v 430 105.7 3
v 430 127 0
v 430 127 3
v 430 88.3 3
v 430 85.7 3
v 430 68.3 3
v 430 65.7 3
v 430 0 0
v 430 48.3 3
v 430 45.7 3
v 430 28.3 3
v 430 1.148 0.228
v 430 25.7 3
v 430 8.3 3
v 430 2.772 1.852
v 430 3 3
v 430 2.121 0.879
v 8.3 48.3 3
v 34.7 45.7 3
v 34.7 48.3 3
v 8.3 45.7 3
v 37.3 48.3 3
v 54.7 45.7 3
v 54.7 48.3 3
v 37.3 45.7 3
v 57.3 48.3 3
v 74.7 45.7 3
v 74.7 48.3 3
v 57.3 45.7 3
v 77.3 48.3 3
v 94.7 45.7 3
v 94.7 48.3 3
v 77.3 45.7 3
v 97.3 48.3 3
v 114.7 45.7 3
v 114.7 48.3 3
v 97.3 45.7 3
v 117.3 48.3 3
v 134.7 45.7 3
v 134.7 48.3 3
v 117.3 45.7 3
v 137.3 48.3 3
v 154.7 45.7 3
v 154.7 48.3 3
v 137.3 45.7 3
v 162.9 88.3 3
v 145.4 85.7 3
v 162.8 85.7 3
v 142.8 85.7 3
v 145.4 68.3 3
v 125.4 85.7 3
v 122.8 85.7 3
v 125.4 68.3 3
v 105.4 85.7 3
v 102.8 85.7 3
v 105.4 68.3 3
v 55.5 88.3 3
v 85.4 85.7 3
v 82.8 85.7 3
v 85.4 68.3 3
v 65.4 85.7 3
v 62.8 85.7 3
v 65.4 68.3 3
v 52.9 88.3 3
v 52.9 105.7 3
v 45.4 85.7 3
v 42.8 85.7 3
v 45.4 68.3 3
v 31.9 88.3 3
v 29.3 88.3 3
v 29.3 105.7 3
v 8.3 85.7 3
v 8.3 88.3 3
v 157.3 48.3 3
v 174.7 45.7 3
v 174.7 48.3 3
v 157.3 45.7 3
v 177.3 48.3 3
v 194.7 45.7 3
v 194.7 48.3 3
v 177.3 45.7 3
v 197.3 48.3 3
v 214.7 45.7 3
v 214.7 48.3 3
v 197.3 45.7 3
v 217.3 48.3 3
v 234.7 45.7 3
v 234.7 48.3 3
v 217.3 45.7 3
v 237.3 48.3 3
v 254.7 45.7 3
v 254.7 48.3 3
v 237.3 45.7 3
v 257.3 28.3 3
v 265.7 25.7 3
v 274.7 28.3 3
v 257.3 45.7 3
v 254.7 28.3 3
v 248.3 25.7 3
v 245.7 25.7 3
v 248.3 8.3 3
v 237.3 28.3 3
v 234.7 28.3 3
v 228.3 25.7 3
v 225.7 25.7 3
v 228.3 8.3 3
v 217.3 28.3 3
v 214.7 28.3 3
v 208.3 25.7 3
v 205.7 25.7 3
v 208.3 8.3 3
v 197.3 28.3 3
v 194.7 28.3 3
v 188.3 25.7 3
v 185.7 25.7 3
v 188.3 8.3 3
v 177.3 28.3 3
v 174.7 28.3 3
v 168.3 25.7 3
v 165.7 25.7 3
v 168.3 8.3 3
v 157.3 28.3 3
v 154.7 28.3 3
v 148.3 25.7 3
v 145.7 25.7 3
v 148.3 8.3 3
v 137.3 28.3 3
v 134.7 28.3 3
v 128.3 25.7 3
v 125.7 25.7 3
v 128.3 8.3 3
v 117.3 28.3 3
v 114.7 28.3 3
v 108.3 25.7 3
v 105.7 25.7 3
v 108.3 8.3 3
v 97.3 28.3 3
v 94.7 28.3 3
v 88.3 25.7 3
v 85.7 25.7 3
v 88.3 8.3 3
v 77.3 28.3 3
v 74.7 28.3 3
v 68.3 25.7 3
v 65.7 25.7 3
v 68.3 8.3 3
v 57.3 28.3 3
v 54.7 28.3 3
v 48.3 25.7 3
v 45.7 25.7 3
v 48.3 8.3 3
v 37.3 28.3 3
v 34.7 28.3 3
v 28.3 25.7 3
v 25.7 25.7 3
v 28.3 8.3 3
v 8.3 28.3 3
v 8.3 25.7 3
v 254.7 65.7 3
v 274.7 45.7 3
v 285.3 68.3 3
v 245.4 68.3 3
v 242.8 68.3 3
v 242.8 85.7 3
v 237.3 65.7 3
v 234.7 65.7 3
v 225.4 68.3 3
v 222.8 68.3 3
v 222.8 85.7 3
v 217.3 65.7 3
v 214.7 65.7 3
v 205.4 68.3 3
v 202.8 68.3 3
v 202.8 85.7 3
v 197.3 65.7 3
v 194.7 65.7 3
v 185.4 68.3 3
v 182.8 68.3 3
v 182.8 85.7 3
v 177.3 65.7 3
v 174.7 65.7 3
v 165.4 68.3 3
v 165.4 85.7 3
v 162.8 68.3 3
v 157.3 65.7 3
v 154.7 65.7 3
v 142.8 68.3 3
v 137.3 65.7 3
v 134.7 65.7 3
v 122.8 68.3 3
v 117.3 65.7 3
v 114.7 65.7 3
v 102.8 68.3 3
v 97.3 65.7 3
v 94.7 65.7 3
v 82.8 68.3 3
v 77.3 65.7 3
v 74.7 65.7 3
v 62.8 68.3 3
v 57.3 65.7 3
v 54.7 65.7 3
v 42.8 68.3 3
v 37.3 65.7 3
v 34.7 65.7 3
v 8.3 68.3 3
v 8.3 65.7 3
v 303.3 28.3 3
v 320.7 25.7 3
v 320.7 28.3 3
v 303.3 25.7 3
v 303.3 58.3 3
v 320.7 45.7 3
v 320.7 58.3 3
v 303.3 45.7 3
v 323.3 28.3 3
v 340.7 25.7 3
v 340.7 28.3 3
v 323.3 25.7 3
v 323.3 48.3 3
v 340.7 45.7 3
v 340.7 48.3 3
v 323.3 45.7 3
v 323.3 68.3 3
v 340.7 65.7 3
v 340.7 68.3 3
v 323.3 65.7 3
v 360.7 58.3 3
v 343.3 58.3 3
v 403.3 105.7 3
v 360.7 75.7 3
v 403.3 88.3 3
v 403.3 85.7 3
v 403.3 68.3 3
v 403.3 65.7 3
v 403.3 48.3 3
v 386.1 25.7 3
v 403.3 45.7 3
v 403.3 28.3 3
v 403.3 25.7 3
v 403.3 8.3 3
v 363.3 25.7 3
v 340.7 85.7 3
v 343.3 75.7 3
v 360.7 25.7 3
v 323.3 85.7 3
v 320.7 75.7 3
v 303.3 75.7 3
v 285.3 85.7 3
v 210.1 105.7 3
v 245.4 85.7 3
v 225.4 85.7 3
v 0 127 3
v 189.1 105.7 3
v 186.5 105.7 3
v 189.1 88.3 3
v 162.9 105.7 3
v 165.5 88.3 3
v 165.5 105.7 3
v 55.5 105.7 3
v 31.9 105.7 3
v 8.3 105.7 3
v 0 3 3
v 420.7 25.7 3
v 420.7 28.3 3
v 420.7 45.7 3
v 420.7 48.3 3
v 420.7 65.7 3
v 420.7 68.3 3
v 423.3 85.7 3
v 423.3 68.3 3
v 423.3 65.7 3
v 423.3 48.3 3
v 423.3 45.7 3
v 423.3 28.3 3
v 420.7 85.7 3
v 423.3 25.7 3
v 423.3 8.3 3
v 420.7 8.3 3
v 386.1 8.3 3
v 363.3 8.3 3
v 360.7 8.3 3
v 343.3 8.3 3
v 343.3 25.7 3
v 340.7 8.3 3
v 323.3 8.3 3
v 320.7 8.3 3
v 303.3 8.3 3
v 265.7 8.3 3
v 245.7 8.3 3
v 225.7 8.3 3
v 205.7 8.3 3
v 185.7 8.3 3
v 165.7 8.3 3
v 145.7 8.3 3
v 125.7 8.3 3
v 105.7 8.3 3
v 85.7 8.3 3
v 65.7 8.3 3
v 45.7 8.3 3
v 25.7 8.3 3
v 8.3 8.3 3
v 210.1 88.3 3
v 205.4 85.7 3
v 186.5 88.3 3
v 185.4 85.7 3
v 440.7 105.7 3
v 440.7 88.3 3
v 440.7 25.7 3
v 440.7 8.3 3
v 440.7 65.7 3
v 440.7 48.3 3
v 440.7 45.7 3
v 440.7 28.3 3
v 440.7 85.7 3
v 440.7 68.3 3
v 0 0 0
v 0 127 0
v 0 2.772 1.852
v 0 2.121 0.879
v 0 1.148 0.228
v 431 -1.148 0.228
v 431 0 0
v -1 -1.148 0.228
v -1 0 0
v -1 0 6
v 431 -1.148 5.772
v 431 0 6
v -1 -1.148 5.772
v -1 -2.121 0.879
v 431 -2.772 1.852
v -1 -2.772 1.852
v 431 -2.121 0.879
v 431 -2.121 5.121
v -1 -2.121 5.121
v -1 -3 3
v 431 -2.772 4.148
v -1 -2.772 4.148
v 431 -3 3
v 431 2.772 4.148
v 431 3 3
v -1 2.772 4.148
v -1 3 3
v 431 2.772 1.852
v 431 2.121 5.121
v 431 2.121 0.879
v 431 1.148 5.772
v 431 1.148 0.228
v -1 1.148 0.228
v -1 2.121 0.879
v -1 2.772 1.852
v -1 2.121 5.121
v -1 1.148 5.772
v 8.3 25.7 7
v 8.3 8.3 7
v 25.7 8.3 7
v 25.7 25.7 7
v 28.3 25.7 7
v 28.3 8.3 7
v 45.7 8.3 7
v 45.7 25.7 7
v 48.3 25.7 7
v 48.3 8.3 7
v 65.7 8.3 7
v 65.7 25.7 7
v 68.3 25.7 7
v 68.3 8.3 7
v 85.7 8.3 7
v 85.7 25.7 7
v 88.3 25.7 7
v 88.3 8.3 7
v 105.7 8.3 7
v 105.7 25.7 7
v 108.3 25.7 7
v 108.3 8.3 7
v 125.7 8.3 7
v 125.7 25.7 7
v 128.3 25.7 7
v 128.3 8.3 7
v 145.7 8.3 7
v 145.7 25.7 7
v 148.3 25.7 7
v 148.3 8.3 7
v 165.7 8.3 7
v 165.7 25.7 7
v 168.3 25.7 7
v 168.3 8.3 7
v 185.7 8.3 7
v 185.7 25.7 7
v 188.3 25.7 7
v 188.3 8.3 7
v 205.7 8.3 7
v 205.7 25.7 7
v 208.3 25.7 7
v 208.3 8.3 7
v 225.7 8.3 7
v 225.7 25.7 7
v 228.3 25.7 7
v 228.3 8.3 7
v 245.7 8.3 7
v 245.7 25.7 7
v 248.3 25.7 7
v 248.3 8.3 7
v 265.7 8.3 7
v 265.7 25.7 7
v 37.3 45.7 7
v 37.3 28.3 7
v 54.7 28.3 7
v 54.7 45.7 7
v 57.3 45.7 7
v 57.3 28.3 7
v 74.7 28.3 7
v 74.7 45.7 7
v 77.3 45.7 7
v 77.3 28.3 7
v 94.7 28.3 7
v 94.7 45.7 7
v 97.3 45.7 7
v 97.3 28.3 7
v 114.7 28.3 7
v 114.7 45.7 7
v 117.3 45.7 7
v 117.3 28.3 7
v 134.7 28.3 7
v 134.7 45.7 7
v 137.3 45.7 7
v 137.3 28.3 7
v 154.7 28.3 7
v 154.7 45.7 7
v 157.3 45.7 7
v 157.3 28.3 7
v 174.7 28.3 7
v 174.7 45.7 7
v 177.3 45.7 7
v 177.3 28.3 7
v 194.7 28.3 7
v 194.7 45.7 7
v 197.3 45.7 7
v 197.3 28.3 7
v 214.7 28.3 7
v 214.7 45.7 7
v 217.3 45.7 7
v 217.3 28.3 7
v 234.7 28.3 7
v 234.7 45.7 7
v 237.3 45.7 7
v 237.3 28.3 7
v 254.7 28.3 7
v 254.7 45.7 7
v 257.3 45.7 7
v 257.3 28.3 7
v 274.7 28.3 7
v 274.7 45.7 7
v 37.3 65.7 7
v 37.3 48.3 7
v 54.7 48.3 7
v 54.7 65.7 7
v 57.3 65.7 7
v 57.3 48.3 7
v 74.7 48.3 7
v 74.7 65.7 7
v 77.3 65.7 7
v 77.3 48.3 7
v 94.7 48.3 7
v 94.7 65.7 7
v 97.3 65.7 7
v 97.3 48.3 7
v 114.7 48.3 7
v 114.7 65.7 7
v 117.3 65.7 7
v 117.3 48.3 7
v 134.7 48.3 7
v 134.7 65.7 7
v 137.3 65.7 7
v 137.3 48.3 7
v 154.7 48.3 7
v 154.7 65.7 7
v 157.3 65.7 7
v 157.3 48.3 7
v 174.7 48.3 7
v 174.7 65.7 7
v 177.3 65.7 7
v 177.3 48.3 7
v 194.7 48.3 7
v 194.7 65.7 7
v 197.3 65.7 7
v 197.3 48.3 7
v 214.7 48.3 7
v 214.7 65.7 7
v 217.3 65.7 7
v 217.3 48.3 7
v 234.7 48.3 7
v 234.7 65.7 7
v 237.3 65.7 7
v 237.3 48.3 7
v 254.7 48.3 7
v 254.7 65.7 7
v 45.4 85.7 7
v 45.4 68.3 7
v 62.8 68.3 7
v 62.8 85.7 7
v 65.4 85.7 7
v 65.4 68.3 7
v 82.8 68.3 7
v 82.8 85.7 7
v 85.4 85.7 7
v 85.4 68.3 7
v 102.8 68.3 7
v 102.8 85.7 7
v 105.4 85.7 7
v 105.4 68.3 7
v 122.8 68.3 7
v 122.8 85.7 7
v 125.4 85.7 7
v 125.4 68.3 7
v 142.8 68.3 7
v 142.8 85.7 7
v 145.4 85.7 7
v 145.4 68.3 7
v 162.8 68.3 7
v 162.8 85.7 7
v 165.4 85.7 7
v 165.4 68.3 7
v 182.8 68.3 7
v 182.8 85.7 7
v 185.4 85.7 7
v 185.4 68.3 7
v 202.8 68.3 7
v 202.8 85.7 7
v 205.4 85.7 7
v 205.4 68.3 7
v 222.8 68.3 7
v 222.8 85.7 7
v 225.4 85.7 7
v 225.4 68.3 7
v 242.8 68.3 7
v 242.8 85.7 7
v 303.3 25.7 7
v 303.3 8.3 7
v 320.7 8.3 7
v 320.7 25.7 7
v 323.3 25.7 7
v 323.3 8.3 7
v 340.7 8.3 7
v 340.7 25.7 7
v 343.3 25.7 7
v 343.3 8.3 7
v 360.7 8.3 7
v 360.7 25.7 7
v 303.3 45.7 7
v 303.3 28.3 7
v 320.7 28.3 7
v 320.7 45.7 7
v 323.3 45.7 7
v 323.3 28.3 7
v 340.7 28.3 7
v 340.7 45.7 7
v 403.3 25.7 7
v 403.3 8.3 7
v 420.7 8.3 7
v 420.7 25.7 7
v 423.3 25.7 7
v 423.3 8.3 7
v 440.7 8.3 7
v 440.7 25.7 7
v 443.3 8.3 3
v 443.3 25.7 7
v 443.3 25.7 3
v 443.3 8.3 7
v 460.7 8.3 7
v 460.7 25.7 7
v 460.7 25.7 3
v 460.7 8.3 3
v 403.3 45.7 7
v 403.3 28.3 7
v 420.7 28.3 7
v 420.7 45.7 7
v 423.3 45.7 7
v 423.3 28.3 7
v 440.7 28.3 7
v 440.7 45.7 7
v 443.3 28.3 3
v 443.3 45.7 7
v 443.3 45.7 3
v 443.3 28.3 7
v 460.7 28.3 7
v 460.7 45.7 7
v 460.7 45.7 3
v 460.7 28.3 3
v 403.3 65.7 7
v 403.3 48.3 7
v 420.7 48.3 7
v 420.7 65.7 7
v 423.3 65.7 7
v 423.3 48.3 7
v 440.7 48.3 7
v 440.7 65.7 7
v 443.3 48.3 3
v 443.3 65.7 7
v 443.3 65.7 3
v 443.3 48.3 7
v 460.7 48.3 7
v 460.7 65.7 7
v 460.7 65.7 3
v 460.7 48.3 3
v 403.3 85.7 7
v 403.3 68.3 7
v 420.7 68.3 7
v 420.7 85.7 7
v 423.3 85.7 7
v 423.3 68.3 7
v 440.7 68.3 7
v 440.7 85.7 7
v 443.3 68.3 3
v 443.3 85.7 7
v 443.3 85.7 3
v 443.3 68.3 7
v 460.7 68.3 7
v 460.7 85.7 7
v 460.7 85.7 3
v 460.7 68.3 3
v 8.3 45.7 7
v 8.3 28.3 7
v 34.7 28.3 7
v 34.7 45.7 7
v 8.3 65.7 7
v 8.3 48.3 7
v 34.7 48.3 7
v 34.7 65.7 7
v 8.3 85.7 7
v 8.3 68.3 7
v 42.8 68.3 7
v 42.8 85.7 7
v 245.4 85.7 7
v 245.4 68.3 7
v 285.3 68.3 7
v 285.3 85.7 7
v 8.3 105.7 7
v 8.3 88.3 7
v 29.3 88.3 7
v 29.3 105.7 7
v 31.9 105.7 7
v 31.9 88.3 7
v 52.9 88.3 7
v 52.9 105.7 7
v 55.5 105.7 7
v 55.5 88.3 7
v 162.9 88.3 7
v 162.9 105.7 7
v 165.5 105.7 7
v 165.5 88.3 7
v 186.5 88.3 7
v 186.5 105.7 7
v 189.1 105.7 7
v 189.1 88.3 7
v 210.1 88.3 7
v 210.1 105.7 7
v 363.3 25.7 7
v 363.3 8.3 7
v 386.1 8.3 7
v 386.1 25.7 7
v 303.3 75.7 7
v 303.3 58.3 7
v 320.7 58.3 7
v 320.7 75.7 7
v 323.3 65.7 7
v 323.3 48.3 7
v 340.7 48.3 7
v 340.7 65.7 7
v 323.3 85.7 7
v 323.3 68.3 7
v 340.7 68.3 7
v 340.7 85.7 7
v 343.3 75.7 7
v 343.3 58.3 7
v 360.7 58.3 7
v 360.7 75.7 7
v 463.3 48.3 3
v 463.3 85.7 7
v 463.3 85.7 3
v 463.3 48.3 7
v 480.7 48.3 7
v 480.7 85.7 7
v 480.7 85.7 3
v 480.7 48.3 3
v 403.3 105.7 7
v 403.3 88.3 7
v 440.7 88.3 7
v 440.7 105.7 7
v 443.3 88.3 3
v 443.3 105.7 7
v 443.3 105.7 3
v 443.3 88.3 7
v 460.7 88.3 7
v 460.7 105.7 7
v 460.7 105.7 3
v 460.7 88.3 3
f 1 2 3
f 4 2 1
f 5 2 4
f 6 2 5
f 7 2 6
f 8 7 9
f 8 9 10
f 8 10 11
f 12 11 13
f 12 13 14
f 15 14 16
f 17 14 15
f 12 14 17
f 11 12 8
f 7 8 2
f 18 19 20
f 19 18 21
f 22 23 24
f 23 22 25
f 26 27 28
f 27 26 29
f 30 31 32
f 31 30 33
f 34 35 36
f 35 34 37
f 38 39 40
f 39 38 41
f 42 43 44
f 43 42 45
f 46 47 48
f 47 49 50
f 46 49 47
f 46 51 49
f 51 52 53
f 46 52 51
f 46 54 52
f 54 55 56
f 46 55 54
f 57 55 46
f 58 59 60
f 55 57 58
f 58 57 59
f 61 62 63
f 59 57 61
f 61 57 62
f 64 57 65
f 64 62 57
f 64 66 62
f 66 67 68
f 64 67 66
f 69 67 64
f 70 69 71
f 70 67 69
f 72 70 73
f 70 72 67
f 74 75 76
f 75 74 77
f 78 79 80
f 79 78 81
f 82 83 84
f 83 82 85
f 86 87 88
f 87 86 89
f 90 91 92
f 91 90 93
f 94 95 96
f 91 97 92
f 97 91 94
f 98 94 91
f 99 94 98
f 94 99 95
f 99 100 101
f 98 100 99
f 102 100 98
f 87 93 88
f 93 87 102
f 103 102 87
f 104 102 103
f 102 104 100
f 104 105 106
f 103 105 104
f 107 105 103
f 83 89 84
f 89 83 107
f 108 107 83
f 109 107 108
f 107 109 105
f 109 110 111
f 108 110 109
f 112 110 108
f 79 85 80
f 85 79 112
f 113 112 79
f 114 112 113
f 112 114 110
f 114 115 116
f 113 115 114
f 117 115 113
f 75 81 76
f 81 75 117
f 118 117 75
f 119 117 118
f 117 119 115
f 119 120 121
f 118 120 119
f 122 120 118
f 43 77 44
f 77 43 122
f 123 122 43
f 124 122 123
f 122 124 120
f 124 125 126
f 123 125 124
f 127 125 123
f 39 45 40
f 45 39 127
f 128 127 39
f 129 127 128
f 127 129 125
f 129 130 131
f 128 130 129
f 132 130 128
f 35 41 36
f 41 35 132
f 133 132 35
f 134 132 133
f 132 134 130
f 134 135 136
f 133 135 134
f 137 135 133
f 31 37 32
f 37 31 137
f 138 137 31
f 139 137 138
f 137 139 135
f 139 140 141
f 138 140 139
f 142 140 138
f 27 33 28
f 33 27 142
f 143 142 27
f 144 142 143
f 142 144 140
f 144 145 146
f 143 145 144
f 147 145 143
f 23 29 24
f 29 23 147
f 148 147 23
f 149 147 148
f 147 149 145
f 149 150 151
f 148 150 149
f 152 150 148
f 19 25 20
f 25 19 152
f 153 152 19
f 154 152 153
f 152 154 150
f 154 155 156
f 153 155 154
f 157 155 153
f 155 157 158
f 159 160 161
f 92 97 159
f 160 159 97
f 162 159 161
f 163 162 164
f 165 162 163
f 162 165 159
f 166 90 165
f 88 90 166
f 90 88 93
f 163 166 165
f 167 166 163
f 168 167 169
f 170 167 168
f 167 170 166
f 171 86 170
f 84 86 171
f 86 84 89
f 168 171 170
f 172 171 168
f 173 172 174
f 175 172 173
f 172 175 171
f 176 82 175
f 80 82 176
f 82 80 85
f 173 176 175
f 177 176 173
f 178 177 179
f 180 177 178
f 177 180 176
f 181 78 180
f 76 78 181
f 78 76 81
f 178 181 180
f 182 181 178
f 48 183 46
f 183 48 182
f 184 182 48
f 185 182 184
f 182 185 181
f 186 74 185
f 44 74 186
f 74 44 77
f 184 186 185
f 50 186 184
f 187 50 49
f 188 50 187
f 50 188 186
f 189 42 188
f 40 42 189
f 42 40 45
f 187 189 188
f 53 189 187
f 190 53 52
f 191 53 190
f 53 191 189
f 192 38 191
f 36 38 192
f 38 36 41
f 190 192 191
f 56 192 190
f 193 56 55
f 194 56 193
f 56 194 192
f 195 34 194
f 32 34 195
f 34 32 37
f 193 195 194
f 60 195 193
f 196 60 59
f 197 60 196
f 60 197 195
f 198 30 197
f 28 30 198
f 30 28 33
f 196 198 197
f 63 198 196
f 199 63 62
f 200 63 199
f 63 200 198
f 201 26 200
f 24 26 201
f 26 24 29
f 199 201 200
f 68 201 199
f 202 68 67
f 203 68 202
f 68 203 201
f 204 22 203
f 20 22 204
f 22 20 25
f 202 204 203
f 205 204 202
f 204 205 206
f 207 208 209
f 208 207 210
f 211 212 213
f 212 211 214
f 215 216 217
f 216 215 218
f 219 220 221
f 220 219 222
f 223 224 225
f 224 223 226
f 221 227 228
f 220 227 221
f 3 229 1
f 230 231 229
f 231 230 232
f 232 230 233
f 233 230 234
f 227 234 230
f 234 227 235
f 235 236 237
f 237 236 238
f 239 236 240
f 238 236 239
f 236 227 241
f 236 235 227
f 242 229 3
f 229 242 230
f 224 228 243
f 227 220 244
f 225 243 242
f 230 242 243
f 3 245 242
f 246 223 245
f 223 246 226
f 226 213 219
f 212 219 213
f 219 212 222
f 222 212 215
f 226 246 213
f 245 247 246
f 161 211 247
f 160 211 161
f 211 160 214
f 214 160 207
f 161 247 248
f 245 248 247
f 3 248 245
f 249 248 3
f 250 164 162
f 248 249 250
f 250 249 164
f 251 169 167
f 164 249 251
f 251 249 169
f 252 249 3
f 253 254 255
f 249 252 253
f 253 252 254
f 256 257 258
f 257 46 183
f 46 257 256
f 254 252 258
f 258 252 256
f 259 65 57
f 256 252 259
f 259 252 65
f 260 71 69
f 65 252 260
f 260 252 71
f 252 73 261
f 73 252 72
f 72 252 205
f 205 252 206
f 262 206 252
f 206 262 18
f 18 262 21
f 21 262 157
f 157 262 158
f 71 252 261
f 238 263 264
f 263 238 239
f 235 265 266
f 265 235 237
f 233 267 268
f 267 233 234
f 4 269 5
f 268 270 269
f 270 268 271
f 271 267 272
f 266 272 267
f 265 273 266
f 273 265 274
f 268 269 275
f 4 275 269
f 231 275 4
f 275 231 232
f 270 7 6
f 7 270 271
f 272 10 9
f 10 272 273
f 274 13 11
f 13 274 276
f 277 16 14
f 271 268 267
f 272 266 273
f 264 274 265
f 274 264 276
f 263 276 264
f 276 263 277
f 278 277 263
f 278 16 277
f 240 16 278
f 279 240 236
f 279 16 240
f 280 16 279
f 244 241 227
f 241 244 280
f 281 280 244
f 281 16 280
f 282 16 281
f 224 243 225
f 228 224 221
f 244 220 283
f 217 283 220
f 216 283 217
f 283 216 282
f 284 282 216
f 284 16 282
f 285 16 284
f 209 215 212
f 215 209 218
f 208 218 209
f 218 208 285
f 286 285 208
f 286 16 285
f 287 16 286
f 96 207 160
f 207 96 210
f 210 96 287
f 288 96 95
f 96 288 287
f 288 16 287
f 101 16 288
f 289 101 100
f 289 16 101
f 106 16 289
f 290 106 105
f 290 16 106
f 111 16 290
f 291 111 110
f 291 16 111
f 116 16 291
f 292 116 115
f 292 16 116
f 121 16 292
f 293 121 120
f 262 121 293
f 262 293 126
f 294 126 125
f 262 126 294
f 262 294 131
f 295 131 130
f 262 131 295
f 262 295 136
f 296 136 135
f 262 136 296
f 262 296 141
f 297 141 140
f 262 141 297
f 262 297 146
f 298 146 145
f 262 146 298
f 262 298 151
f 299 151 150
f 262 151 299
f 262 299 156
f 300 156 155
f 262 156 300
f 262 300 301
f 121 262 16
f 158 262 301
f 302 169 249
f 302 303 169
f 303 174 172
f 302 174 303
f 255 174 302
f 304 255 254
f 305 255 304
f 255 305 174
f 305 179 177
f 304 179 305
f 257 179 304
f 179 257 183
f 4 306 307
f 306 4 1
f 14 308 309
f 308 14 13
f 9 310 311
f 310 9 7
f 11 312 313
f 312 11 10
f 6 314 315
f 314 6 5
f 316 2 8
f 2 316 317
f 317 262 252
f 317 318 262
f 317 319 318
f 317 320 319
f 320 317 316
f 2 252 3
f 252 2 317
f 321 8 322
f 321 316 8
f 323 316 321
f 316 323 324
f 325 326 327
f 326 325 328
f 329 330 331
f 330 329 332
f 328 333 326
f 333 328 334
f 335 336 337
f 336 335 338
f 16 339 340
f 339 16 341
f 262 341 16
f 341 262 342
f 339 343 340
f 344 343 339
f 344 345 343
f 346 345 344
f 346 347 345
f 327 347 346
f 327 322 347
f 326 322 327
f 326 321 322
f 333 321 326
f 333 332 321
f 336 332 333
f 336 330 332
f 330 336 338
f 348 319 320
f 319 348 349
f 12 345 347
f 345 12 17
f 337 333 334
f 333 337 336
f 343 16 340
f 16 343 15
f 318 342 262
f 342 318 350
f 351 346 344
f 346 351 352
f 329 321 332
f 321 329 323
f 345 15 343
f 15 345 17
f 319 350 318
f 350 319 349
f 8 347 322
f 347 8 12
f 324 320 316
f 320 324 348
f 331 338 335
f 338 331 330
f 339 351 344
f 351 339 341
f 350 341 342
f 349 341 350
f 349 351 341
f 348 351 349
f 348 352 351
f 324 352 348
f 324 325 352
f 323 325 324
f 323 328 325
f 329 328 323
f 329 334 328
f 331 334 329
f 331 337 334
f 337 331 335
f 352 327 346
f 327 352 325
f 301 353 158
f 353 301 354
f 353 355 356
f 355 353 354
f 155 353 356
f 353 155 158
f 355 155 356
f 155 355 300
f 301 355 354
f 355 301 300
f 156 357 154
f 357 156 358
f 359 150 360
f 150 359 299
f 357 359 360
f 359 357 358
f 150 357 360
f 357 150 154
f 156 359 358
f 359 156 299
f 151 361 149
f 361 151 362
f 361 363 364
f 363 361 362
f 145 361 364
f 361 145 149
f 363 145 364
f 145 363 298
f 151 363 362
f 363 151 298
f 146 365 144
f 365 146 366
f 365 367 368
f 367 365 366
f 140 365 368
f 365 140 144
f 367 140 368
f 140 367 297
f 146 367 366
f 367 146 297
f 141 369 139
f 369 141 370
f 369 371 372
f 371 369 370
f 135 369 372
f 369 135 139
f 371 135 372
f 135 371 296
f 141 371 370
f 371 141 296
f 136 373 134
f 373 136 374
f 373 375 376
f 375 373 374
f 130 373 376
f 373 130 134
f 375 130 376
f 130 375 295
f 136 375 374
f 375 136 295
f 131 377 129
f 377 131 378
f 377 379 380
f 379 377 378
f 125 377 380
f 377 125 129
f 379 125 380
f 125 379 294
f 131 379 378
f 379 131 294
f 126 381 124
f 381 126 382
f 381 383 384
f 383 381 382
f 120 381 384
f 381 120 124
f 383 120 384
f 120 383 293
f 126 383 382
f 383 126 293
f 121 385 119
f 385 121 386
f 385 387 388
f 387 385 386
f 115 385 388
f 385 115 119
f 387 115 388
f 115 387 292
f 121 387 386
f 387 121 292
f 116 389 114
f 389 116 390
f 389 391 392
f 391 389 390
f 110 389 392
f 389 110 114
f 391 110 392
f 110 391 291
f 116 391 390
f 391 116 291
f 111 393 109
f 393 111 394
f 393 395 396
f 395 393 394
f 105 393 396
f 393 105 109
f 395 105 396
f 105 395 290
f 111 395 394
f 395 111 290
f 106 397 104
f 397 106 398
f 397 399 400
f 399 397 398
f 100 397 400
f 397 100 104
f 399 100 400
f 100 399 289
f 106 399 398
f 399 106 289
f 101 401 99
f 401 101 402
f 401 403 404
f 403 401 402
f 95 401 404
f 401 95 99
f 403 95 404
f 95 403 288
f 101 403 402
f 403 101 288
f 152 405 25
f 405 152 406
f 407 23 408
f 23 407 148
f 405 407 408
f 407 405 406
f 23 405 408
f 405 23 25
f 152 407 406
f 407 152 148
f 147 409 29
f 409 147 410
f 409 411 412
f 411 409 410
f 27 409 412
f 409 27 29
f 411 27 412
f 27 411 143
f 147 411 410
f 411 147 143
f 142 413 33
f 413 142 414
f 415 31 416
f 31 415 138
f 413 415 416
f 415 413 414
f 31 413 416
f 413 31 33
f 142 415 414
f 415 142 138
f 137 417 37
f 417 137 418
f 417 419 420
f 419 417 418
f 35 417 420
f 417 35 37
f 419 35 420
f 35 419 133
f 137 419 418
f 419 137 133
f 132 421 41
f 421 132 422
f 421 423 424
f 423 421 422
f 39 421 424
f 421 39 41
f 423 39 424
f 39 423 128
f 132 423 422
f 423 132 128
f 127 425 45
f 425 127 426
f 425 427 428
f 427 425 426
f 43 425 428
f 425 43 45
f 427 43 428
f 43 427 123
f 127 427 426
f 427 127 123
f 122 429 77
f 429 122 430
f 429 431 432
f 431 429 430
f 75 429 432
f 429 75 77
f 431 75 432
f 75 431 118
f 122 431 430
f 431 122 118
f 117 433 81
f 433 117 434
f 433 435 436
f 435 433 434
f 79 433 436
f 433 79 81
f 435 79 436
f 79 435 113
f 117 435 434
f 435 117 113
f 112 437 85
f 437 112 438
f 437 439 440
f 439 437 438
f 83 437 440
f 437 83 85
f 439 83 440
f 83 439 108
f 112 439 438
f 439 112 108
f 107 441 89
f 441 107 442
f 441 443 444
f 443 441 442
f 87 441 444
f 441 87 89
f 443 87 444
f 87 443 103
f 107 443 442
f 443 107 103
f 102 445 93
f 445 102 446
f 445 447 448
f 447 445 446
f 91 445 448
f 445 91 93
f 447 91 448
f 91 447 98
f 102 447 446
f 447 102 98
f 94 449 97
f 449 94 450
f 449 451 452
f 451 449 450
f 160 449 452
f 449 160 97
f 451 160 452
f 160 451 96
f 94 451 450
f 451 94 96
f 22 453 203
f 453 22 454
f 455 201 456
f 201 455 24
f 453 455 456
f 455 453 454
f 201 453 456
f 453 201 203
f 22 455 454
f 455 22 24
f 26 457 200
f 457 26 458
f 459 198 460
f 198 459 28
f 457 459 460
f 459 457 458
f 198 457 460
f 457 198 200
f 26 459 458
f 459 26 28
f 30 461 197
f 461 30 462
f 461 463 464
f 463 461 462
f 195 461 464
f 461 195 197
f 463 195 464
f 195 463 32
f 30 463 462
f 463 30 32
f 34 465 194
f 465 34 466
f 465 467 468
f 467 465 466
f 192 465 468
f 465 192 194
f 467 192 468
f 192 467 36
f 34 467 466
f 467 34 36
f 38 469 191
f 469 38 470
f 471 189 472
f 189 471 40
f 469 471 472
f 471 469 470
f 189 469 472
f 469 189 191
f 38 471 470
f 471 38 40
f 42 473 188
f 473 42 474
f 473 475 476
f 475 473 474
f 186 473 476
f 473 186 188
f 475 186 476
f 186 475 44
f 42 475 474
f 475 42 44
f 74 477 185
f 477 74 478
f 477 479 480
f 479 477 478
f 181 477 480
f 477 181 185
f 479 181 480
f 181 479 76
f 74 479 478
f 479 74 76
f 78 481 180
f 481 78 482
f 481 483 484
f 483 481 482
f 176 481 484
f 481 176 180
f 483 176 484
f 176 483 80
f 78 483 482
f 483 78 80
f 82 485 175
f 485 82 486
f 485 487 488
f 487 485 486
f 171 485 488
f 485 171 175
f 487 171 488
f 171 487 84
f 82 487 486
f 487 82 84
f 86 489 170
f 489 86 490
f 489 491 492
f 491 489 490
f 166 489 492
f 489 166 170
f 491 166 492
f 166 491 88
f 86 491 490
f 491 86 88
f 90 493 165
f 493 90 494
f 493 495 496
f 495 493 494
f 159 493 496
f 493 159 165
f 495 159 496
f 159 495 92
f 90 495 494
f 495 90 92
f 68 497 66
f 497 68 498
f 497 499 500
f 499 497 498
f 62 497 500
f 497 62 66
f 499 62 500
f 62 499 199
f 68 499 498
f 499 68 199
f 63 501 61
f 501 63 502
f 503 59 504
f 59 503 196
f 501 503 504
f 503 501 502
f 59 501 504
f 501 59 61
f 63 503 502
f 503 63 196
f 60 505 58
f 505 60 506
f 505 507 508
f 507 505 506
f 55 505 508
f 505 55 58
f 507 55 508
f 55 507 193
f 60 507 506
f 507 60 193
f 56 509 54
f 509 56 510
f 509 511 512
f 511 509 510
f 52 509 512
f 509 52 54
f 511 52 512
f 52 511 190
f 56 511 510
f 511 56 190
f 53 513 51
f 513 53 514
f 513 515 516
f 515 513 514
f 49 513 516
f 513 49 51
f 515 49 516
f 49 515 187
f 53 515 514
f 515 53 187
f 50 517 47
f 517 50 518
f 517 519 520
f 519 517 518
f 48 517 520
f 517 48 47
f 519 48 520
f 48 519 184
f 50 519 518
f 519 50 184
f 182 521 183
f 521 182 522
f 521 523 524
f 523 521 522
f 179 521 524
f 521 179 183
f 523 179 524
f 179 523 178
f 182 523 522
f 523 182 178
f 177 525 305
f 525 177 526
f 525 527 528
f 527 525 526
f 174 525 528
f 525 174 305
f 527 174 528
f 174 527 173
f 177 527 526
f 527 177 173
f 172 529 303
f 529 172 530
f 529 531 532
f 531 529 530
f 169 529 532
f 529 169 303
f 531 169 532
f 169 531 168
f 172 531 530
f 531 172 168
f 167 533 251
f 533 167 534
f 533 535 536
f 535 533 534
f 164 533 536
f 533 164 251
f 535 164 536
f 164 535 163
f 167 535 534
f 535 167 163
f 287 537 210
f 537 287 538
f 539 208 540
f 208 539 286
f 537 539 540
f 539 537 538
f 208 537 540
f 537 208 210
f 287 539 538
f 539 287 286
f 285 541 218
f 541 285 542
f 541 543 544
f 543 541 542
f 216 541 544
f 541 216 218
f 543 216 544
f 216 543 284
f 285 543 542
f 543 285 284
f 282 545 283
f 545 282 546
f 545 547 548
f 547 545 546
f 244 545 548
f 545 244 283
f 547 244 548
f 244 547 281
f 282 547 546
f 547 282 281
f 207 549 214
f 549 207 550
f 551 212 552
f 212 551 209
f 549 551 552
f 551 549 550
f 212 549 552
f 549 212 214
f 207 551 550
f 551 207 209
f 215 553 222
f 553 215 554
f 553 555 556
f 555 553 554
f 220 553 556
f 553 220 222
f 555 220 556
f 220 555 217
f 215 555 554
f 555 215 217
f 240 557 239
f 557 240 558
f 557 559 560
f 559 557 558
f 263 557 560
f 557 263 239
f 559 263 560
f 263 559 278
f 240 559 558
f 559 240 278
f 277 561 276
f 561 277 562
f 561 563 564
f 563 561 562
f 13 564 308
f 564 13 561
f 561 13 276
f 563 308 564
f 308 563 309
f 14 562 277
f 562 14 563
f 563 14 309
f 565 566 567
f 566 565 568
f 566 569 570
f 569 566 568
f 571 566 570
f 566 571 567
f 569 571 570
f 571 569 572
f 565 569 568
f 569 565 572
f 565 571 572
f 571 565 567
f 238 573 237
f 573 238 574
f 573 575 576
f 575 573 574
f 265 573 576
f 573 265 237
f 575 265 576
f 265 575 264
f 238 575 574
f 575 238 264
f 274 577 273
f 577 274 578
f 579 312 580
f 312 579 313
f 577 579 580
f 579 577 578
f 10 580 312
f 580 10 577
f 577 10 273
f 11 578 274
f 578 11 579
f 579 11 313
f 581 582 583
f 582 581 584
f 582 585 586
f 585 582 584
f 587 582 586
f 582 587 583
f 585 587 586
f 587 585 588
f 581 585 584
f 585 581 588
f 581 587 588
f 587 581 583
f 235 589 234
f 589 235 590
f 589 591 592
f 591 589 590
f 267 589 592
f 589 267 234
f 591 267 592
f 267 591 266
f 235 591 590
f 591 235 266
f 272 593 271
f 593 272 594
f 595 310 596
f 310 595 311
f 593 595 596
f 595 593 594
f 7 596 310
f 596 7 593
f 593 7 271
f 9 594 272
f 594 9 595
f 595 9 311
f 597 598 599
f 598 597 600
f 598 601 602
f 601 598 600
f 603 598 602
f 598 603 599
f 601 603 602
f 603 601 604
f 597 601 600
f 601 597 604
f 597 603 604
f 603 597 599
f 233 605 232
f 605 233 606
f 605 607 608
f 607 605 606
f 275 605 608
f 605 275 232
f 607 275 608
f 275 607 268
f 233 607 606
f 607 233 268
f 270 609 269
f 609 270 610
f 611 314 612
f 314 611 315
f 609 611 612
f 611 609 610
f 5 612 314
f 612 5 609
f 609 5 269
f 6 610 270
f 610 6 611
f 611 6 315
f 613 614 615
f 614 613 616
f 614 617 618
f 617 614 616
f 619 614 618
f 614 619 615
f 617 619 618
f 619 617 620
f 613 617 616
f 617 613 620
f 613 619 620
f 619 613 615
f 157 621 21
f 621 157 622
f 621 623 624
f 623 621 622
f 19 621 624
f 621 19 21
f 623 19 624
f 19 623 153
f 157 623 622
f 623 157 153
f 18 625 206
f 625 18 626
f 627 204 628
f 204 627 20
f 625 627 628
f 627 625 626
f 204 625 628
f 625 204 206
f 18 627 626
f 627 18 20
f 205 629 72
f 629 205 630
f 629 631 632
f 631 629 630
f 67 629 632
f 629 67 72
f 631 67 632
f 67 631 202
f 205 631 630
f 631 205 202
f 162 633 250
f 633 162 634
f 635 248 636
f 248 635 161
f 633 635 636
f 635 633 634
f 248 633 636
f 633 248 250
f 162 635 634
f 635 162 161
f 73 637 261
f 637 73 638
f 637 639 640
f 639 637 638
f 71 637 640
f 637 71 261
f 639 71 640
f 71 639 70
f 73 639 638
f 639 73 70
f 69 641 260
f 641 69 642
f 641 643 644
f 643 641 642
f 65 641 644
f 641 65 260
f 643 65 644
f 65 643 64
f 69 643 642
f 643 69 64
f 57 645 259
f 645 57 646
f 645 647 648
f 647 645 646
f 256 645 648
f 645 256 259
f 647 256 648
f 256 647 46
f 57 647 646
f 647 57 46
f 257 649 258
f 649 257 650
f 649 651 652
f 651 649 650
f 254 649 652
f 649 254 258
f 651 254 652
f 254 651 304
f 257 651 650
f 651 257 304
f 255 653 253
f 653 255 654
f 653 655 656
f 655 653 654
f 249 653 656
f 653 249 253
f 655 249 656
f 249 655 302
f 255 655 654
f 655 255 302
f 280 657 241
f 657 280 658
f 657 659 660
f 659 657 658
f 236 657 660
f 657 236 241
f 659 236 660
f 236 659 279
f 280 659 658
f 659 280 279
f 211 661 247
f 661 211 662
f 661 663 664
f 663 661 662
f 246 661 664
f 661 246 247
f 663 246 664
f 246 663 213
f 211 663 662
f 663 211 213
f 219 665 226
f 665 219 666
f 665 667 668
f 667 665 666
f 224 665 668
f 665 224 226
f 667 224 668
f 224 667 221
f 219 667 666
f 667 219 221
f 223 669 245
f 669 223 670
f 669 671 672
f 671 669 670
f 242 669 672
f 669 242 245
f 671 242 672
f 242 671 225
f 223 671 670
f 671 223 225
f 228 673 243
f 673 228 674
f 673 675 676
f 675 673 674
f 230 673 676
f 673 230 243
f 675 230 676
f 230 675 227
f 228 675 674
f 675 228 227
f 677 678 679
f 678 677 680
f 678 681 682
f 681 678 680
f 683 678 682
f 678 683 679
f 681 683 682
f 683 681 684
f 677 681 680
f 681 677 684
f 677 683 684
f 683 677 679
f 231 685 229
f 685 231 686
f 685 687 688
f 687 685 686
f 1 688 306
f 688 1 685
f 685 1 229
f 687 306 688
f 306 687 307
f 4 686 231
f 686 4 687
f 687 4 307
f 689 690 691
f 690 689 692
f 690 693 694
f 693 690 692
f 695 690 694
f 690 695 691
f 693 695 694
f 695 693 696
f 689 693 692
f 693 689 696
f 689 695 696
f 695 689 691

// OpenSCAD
// Wireless Keyboard 3D Model - Simplified for efficient rendering
$fn = 24; // Moderate resolution for faster STL export

// ==============================================
// Global Parameters
// ==============================================

// Overall keyboard dimensions
kb_width = 430;      // Total width (left to right)
kb_depth = 127;      // Total depth (front to back)
base_height = 3;     // Base plate thickness
edge_height = 5;     // Raised edge height
edge_width = 3;      // Edge border width

// Key dimensions
key_h = 4;           // Key height
key_w = 18;          // Standard key width
key_d = 18;          // Standard key depth
key_gap = 2;         // Gap between keys

// Wide key multiples
wide_mult = 1.5;     // Shift, Tab, Caps width multiplier
spacebar_mult = 6;   // Spacebar width multiplier

// Layout positioning
margin_x = 8;        // Left margin
margin_y = 8;        // Top margin

// ==============================================
// Modules
// ==============================================

// Simple rounded key cap
module keycap(w, d, h) {
    hull() {
        translate([0.3, 0.3, 0]) cube([w-0.6, d-0.6, h-0.3]);
        translate([0.3, 0.3, h-0.5]) cube([w-0.6, d-0.6, 0.5]);
    }
}

// Keyboard base with rounded front edge
module base() {
    union() {
        // Main base plate
        cube([kb_width, kb_depth, base_height]);
        
        // Front curved edge (lip)
        translate([0, 0, base_height])
            rotate([0, 90, 0])
                translate([0, 0, -1])
                    linear_extrude(height = kb_width + 2)
                        circle(r = edge_width, $fn = 16);
    }
}

// Key row helper
module key_row(count, start_x, start_y, row_width, key_type_w) {
    x_pos = start_x;
    for (i = [0:count-1]) {
        translate([x_pos, start_y, base_height])
            keycap(key_type_w, key_d, key_h);
        x_pos = x_pos + key_type_w + key_gap;
    }
}

// Main keyboard layout
module keyboard_layout() {
    // Row 1: Number row (13 standard keys)
    for (i = [0:12]) {
        translate([margin_x + i*(key_w + key_gap), margin_y, base_height])
            keycap(key_w, key_d, key_h);
    }
    
    // Row 2: Tab + QWERTY row
    row2_y = margin_y + key_d + key_gap;
    translate([margin_x, row2_y, base_height])
        keycap(key_w * wide_mult, key_d, key_h);
    for (i = [0:11]) {
        translate([margin_x + key_w*wide_mult + key_gap + i*(key_w + key_gap), row2_y, base_height])
            keycap(key_w, key_d, key_h);
    }
    
    // Row 3: Caps Lock + ASDF row
    row3_y = margin_y + 2*(key_d + key_gap);
    translate([margin_x, row3_y, base_height])
        keycap(key_w * wide_mult, key_d, key_h);
    for (i = [0:10]) {
        translate([margin_x + key_w*wide_mult + key_gap + i*(key_w + key_gap), row3_y, base_height])
            keycap(key_w, key_d, key_h);
    }
    
    // Row 4: Left Shift + ZXCV row + Right Shift
    row4_y = margin_y + 3*(key_d + key_gap);
    translate([margin_x, row4_y, base_height])
        keycap(key_w * wide_mult * 1.3, key_d, key_h);
    for (i = [0:9]) {
        translate([margin_x + key_w*wide_mult*1.3 + key_gap + i*(key_w + key_gap), row4_y, base_height])
            keycap(key_w, key_d, key_h);
    }
    translate([margin_x + key_w*wide_mult*1.3 + key_gap + 10*(key_w + key_gap), row4_y, base_height])
        keycap(key_w * wide_mult * 1.5, key_d, key_h);
    
    // Row 5: Ctrl, Alt, Spacebar, Alt, Ctrl
    row5_y = margin_y + 4*(key_d + key_gap);
    // Left modifiers
    translate([margin_x, row5_y, base_height])
        keycap(key_w * 1.2, key_d, key_h);
    translate([margin_x + key_w*1.2 + key_gap, row5_y, base_height])
        keycap(key_w * 1.2, key_d, key_h);
    // Spacebar
    spacebar_x = margin_x + 2*(key_w*1.2 + key_gap);
    translate([spacebar_x, row5_y, base_height])
        keycap(key_w * spacebar_mult, key_d, key_h);
    // Right modifiers
    translate([spacebar_x + key_w*spacebar_mult + key_gap, row5_y, base_height])
        keycap(key_w * 1.2, key_d, key_h);
    translate([spacebar_x + key_w*spacebar_mult + 2*key_gap + key_w*1.2, row5_y, base_height])
        keycap(key_w * 1.2, key_d, key_h);
    
    // Navigation cluster (right side)
    nav_start_x = margin_x + 14*(key_w + key_gap) + 15;
    
    // Nav Row 1: Insert, Home, PgUp, Del
    for (i = [0:2]) {
        translate([nav_start_x + i*(key_w + key_gap), margin_y, base_height])
            keycap(key_w, key_d, key_h);
    }
    translate([nav_start_x + 3*(key_w + key_gap), margin_y, base_height])
        keycap(key_w * 1.3, key_d, key_h);
    
    // Nav Row 2: End, PgDn
    for (i = [0:1]) {
        translate([nav_start_x + i*(key_w + key_gap), margin_y + key_d + key_gap, base_height])
            keycap(key_w, key_d, key_h);
    }
    
    // Arrow keys (inverted T)
    arrow_y = margin_y + 2.5*(key_d + key_gap);
    // Left arrow
    translate([nav_start_x, arrow_y, base_height])
        keycap(key_w, key_d, key_h);
    // Up arrow
    translate([nav_start_x + key_w + key_gap, arrow_y - (key_d + key_gap)/2, base_height])
        keycap(key_w, key_d, key_h);
    // Down arrow
    translate([nav_start_x + key_w + key_gap, arrow_y + (key_d + key_gap)/2, base_height])
        keycap(key_w, key_d, key_h);
    // Right arrow
    translate([nav_start_x + 2*(key_w + key_gap), arrow_y, base_height])
        keycap(key_w, key_d, key_h);
    
    // Numpad area (far right)
    numpad_x = nav_start_x + 5*(key_w + key_gap);
    
    // Numpad rows 1-4
    for (row = [0:3]) {
        for (col = [0:2]) {
            translate([numpad_x + col*(key_w + key_gap), margin_y + row*(key_d + key_gap), base_height])
                keycap(key_w, key_d, key_h);
        }
    }
    // Numpad Enter (tall)
    translate([numpad_x + 3*(key_w + key_gap), margin_y + 2*(key_d + key_gap), base_height])
        keycap(key_w, key_d*2 + key_gap, key_h);
    
    // Numpad 0 (wide) and decimal
    translate([numpad_x, margin_y + 4*(key_d + key_gap), base_height])
        keycap(key_w*2 + key_gap, key_d, key_h);
    translate([numpad_x + 2*(key_w + key_gap), margin_y + 4*(key_d + key_gap), base_height])
        keycap(key_w, key_d, key_h);
}

// ==============================================
// Main Assembly
// ==============================================
module keyboard() {
    color("LightGray") base();
    color("SlateGray") keyboard_layout();
}

// Render the keyboard
keyboard();
